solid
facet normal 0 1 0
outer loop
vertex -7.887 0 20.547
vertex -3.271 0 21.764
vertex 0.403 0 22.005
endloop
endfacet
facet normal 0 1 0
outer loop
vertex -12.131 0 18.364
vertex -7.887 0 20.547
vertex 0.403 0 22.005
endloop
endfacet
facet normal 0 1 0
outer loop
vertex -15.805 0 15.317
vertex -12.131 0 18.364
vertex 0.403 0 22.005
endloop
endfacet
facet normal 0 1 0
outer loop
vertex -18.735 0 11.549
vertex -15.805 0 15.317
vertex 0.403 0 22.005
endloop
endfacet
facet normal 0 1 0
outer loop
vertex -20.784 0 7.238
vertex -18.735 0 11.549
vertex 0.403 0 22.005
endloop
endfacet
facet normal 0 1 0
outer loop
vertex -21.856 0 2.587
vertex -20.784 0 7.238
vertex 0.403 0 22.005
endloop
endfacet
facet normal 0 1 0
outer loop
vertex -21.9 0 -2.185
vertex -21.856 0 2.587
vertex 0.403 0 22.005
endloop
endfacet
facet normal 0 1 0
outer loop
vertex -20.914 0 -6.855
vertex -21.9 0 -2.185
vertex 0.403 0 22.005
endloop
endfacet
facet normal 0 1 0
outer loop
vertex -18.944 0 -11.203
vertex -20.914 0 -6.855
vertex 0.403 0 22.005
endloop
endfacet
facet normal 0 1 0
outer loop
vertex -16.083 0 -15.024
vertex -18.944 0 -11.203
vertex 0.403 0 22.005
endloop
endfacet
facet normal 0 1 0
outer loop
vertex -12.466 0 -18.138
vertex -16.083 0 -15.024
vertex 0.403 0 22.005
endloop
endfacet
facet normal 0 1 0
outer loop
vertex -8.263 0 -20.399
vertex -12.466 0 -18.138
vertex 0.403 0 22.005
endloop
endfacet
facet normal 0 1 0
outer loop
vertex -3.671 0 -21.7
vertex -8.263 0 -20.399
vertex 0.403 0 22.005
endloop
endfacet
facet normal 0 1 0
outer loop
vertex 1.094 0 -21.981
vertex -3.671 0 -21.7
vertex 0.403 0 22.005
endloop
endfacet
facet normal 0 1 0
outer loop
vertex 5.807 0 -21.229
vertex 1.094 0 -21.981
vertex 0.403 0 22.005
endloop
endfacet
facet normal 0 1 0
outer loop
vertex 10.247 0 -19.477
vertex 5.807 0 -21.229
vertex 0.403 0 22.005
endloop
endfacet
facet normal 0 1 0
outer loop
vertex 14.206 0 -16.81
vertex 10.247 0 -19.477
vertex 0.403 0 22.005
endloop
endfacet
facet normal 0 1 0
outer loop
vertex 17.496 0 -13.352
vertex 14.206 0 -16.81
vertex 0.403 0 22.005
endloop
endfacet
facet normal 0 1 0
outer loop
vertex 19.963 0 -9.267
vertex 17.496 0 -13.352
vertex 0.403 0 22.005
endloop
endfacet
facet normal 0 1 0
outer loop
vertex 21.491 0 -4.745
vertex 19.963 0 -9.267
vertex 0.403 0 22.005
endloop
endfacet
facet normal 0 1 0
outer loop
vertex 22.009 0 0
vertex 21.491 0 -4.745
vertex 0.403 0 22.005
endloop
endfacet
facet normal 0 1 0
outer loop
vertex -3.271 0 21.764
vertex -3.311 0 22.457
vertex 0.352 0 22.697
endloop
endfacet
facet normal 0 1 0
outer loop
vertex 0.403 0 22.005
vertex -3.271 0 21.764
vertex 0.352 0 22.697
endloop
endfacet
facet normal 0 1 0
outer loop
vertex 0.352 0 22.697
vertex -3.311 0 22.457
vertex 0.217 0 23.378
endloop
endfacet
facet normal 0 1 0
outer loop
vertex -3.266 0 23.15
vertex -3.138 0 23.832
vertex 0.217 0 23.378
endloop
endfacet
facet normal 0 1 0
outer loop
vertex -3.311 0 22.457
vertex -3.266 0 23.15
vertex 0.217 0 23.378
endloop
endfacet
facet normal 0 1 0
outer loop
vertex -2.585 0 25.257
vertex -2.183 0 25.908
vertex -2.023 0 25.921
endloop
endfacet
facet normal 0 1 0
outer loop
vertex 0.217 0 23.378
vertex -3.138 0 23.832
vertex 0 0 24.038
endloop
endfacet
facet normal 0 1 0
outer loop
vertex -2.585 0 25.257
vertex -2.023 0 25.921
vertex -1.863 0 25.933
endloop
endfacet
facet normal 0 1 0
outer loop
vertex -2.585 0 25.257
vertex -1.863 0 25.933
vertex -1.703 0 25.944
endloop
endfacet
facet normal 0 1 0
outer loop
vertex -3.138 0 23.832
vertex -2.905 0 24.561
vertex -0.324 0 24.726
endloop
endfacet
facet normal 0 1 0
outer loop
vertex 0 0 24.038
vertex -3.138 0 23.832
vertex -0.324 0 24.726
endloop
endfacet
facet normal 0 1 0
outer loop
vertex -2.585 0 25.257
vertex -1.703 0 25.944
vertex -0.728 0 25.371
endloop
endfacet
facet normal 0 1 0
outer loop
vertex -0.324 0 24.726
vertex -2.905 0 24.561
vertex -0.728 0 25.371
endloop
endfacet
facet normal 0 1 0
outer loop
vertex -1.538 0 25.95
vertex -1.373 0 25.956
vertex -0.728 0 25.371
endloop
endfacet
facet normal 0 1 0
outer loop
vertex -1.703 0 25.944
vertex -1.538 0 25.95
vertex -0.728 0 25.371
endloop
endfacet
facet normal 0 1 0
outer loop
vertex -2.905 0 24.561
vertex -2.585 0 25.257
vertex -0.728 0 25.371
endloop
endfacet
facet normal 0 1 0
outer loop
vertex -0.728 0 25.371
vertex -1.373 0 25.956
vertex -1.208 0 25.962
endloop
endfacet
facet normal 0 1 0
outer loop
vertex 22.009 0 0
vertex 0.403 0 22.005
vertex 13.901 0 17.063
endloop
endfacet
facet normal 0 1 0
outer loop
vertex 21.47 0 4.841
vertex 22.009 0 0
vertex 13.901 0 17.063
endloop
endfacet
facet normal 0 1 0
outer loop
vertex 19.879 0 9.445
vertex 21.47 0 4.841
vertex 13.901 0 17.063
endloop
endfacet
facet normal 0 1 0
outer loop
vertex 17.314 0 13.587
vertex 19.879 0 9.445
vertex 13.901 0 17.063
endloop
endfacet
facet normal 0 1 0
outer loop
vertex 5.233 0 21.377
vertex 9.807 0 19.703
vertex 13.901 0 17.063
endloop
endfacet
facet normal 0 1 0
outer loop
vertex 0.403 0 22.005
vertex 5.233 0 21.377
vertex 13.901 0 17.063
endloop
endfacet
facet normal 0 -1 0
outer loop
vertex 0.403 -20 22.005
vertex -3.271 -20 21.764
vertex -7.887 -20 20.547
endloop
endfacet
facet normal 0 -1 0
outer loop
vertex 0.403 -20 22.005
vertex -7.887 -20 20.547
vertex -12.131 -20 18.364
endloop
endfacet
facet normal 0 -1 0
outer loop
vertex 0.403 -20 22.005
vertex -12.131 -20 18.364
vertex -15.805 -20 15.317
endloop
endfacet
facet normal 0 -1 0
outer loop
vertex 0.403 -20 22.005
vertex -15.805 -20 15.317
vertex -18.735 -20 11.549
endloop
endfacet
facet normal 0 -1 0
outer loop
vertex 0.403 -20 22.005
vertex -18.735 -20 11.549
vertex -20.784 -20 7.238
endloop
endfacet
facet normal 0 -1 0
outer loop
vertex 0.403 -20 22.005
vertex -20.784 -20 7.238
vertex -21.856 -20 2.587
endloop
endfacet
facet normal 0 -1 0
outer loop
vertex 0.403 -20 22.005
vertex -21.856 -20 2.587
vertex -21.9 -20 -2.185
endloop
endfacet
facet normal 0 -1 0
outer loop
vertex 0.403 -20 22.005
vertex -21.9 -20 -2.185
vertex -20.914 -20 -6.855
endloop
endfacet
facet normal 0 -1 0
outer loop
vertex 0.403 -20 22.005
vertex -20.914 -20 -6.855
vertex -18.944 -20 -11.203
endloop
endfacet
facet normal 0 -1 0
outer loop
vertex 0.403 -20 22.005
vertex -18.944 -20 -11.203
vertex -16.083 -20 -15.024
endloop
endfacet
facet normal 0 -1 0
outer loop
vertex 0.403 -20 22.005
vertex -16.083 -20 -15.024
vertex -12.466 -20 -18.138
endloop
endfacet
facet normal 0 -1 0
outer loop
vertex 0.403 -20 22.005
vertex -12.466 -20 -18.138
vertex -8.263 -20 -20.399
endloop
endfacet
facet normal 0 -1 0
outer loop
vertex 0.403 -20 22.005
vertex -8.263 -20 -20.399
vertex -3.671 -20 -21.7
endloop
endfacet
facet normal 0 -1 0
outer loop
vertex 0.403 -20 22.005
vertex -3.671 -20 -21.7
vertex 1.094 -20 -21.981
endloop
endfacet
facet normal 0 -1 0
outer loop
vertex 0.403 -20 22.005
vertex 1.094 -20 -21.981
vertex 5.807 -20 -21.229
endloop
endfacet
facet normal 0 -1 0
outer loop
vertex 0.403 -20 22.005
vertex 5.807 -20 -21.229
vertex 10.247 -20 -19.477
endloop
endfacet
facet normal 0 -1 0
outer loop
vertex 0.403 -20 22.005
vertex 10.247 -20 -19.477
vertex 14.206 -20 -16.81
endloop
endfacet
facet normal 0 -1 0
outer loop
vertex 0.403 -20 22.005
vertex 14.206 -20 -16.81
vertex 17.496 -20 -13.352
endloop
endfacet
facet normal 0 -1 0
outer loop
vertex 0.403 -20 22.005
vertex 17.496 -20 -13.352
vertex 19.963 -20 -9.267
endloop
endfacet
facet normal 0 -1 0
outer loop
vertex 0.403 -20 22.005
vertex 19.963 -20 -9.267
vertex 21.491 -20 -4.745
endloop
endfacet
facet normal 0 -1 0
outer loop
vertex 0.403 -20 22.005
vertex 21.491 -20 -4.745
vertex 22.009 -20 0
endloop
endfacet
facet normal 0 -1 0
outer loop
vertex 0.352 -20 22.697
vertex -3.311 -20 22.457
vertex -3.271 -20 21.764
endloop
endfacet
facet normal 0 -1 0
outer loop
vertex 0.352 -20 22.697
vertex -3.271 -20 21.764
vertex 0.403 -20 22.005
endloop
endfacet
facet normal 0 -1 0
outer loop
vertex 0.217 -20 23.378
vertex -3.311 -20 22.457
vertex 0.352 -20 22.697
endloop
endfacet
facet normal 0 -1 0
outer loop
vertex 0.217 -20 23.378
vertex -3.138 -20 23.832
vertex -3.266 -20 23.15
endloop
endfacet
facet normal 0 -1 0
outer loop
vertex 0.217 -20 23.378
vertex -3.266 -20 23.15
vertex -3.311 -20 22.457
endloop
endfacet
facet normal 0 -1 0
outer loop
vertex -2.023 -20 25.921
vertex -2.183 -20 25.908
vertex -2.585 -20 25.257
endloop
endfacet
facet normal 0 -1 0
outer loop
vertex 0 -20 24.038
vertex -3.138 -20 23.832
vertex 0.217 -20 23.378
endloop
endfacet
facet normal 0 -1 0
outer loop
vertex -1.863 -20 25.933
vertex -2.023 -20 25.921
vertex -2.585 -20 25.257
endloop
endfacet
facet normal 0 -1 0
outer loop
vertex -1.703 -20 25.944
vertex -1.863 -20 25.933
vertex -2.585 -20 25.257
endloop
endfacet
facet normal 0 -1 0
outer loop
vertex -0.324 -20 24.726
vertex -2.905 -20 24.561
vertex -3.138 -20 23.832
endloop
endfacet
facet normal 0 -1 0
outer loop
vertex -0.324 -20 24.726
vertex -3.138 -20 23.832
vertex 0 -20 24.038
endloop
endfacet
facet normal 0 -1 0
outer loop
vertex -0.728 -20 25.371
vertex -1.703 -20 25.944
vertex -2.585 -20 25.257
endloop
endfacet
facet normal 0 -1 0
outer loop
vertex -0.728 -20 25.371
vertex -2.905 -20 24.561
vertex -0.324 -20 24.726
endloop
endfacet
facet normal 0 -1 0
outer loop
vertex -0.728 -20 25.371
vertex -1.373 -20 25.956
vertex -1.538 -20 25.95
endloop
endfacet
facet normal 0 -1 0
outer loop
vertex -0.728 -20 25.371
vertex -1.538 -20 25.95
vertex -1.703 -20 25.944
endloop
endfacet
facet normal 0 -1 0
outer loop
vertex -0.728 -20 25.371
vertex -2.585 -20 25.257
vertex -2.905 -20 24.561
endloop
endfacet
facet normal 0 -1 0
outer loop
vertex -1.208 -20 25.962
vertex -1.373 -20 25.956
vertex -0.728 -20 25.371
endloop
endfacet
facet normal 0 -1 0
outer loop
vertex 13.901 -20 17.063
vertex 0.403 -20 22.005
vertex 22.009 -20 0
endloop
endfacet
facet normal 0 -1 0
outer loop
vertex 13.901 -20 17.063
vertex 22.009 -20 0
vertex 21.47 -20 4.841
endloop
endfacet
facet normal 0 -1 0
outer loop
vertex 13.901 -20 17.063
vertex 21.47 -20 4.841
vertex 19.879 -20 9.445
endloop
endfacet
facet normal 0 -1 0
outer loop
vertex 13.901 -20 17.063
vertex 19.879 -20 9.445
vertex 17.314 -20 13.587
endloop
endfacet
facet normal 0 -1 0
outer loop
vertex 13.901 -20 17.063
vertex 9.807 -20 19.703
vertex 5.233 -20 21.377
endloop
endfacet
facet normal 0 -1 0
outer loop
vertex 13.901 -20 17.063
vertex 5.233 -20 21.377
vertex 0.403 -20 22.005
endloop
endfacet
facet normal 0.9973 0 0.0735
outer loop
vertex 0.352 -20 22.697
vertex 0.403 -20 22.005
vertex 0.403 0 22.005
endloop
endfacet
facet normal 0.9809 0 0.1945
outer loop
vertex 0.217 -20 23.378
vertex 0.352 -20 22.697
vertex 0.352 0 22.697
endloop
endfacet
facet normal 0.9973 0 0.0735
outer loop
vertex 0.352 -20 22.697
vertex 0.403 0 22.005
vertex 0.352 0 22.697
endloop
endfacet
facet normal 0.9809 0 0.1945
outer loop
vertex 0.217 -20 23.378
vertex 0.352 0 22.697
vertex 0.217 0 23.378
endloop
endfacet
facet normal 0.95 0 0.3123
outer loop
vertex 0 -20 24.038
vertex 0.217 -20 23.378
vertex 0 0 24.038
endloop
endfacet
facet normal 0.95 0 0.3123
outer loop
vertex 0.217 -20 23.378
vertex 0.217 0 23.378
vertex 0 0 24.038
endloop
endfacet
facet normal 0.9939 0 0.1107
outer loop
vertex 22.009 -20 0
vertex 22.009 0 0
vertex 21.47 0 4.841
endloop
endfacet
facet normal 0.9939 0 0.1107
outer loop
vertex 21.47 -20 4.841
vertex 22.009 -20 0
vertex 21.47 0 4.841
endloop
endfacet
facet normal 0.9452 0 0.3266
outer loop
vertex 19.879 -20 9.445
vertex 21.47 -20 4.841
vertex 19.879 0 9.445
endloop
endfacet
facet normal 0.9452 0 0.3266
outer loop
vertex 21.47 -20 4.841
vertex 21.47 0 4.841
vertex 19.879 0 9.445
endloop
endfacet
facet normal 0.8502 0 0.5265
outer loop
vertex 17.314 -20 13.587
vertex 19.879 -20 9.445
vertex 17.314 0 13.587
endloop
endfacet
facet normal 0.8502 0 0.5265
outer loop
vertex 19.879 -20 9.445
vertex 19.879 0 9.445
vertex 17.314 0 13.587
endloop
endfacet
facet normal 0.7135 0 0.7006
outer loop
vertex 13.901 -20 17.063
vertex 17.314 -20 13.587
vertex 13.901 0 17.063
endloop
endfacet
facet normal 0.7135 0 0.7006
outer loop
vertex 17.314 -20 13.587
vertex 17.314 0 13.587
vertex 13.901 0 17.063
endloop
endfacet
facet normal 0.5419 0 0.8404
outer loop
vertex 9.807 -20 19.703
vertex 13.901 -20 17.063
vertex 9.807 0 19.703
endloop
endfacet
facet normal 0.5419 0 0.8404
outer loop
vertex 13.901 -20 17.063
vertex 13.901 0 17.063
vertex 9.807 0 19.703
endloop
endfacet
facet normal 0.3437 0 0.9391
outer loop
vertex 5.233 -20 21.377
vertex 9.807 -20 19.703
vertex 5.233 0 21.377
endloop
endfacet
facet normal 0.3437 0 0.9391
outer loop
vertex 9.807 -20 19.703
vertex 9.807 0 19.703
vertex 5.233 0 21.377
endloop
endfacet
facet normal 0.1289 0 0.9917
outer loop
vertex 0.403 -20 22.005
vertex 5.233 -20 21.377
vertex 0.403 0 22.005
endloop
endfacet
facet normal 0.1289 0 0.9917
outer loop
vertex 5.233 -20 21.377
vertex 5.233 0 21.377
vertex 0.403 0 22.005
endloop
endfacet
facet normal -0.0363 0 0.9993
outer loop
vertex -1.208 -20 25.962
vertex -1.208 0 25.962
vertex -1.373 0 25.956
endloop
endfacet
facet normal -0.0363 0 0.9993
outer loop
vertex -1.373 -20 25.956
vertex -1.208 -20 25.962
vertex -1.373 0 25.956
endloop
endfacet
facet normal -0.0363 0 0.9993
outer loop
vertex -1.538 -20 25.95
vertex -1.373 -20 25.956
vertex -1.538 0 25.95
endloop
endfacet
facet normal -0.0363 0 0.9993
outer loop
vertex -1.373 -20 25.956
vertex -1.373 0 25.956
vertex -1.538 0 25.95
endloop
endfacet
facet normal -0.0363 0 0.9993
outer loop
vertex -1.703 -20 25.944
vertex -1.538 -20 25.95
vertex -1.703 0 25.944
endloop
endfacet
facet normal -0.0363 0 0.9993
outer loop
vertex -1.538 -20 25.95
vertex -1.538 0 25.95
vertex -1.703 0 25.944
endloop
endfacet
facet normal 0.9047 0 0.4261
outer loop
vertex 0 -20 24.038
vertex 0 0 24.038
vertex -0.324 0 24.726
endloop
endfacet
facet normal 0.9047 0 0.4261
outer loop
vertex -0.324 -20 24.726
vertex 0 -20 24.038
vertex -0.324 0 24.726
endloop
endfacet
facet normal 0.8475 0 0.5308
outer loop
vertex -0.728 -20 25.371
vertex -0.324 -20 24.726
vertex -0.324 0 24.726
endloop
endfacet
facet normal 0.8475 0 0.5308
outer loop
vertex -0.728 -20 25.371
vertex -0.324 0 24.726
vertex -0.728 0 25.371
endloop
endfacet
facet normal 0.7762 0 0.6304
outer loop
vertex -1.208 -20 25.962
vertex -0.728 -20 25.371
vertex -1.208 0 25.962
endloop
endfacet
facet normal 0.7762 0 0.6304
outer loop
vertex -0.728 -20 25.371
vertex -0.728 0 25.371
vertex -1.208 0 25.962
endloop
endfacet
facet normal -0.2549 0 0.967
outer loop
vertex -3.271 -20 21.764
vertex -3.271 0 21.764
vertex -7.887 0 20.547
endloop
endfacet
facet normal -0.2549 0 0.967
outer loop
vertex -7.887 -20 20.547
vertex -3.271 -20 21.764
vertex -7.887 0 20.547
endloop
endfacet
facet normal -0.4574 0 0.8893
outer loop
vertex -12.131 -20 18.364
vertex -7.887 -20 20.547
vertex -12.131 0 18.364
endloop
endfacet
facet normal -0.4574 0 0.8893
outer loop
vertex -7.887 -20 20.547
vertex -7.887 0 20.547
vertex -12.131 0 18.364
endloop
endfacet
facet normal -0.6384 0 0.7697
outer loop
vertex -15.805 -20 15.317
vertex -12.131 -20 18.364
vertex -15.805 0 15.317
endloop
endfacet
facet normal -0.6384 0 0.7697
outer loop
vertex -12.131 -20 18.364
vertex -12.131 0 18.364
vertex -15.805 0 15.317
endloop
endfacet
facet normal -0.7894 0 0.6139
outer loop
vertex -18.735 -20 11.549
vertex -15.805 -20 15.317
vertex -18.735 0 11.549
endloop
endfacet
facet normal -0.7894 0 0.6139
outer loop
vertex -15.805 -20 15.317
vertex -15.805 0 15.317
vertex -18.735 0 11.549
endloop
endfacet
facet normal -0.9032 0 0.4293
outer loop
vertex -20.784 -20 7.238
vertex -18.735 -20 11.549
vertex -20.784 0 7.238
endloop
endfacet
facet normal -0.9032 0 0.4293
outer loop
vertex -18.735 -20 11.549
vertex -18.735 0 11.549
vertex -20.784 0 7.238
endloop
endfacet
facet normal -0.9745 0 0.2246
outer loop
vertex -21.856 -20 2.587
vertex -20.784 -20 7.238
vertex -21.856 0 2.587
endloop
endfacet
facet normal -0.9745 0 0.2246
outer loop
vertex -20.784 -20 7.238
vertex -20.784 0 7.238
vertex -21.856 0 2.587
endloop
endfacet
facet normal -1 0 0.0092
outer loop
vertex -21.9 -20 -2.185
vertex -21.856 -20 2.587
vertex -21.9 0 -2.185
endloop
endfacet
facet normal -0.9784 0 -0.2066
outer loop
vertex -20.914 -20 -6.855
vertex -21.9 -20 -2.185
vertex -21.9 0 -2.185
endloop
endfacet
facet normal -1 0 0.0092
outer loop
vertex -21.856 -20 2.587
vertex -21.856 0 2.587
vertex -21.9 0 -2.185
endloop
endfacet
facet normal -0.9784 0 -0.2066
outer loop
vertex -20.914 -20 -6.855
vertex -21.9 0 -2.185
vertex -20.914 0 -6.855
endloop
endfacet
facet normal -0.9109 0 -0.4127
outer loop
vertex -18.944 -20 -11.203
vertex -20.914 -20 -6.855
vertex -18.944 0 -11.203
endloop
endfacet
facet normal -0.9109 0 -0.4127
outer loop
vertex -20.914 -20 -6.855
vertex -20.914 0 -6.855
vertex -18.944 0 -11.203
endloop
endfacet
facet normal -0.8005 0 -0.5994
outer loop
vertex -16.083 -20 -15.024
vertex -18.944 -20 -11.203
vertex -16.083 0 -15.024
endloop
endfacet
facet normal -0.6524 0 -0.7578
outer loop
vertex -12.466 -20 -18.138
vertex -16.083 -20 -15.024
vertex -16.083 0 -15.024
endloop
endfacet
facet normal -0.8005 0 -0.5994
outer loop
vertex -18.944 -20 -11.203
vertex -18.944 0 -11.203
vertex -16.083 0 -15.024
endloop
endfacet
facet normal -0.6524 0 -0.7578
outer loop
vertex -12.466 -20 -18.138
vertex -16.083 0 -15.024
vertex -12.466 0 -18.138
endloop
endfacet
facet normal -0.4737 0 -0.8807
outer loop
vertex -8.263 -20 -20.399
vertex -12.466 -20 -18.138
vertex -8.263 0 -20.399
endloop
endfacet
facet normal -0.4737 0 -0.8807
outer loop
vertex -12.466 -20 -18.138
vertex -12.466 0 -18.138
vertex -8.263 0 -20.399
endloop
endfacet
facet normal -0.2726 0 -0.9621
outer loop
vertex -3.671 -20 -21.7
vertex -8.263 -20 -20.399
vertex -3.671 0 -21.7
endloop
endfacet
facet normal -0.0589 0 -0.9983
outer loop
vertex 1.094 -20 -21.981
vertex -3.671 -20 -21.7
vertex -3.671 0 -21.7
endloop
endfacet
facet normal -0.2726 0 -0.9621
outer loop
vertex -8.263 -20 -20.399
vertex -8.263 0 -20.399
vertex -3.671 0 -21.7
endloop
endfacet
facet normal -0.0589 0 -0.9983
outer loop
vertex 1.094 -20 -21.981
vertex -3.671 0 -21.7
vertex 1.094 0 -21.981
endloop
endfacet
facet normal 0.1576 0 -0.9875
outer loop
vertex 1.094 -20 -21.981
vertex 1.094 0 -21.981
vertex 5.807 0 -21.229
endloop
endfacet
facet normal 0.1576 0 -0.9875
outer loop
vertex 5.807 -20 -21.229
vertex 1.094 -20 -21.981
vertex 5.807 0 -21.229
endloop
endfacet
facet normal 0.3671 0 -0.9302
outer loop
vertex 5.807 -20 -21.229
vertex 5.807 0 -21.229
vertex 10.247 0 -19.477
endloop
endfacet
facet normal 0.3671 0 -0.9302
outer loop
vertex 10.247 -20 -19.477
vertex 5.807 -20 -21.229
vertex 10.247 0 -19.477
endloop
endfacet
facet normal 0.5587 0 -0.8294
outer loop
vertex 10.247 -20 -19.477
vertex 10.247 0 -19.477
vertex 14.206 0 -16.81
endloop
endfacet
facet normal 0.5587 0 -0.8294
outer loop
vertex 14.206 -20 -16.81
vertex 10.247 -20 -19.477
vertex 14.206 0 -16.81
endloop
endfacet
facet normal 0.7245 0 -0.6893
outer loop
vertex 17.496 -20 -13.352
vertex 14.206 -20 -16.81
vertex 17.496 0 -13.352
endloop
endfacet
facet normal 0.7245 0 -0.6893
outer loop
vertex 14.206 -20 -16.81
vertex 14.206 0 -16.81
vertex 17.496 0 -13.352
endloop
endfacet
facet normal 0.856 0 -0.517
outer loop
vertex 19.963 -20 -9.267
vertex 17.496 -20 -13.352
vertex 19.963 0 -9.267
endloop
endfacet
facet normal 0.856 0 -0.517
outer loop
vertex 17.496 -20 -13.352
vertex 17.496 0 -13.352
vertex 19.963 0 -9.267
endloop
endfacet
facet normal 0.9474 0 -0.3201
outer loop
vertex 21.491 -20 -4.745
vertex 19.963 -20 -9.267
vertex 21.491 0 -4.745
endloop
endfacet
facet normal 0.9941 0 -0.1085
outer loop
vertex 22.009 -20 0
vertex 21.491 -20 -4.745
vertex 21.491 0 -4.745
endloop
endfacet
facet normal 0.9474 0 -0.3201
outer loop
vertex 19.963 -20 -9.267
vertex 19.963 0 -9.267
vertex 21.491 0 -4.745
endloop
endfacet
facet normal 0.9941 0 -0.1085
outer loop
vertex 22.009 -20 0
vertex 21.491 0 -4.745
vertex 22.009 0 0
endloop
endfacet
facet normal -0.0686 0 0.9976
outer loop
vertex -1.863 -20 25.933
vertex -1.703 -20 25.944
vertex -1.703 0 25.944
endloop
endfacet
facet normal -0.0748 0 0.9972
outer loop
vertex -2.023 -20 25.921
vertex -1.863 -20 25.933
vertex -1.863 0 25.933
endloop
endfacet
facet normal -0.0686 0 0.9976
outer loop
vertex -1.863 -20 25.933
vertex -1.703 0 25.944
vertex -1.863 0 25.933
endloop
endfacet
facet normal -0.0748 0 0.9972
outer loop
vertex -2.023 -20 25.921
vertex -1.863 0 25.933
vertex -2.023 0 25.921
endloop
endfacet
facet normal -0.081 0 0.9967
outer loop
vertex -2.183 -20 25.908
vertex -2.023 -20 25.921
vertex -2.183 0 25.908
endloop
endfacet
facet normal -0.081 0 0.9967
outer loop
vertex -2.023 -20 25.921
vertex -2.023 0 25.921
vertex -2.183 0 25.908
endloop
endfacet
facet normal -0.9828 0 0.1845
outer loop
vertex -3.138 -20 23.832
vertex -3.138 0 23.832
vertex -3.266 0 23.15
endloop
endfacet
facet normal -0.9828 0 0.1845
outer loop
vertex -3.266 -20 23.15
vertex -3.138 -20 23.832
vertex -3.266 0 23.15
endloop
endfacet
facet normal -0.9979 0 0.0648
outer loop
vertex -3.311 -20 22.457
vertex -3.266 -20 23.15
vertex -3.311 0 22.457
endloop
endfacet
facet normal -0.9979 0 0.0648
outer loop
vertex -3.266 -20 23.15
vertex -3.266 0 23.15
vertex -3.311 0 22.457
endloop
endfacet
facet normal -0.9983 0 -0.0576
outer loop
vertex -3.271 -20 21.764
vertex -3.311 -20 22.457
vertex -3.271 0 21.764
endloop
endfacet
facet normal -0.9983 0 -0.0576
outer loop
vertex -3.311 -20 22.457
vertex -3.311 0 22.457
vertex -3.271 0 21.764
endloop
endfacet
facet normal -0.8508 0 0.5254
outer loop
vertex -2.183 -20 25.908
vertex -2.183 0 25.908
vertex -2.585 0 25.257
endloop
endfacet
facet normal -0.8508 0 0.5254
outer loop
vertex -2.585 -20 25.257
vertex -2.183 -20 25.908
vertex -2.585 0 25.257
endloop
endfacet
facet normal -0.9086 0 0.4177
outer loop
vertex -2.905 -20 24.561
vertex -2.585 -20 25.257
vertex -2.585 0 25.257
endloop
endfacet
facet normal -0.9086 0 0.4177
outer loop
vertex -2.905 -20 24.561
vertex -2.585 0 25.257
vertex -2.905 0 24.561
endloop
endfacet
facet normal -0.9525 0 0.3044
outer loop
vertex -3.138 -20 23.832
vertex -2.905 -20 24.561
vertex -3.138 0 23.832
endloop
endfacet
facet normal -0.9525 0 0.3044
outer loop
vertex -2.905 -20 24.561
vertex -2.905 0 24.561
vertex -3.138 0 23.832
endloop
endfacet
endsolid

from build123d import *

# Parameters (mm, degrees)
F1_DEPTH = 20.000011


with BuildPart() as f1:
    # F0 (on Front) → F1 (new body)
    with BuildSketch(Plane.XZ):
        with BuildLine():
            ThreePointArc((-3.271326, 21.764202), (-14.359396, -16.679023), (22.008682, 0))
            ThreePointArc((22.008682, 0), (15.704163, 15.419512), (0.402541, 22.005))
            ThreePointArc((0.402541, 22.005), (-1.439437, 21.961559), (-3.271326, 21.764202))
        make_face()
        with BuildLine():
            ThreePointArc((-3.271326, 21.764202), (-1.439437, 21.961559), (0.402541, 22.005))
            ThreePointArc((0.402541, 22.005), (0.294678, 23.039922), (0, 24.037851))
            ThreePointArc((0, 24.037851), (-0.516199, 25.054794), (-1.207822, 25.961598))
            ThreePointArc((-1.207822, 25.961598), (-1.455449, 25.953355), (-1.703043, 25.944164))
            ThreePointArc((-1.703043, 25.944164), (-1.943324, 25.927273), (-2.183439, 25.908157))
            ThreePointArc((-2.183439, 25.908157), (-2.755717, 24.913941), (-3.137569, 23.832204))
            ThreePointArc((-3.137569, 23.832204), (-3.299471, 22.804349), (-3.271326, 21.764202))
        make_face()
    extrude(amount=F1_DEPTH)


solid = f1.part
